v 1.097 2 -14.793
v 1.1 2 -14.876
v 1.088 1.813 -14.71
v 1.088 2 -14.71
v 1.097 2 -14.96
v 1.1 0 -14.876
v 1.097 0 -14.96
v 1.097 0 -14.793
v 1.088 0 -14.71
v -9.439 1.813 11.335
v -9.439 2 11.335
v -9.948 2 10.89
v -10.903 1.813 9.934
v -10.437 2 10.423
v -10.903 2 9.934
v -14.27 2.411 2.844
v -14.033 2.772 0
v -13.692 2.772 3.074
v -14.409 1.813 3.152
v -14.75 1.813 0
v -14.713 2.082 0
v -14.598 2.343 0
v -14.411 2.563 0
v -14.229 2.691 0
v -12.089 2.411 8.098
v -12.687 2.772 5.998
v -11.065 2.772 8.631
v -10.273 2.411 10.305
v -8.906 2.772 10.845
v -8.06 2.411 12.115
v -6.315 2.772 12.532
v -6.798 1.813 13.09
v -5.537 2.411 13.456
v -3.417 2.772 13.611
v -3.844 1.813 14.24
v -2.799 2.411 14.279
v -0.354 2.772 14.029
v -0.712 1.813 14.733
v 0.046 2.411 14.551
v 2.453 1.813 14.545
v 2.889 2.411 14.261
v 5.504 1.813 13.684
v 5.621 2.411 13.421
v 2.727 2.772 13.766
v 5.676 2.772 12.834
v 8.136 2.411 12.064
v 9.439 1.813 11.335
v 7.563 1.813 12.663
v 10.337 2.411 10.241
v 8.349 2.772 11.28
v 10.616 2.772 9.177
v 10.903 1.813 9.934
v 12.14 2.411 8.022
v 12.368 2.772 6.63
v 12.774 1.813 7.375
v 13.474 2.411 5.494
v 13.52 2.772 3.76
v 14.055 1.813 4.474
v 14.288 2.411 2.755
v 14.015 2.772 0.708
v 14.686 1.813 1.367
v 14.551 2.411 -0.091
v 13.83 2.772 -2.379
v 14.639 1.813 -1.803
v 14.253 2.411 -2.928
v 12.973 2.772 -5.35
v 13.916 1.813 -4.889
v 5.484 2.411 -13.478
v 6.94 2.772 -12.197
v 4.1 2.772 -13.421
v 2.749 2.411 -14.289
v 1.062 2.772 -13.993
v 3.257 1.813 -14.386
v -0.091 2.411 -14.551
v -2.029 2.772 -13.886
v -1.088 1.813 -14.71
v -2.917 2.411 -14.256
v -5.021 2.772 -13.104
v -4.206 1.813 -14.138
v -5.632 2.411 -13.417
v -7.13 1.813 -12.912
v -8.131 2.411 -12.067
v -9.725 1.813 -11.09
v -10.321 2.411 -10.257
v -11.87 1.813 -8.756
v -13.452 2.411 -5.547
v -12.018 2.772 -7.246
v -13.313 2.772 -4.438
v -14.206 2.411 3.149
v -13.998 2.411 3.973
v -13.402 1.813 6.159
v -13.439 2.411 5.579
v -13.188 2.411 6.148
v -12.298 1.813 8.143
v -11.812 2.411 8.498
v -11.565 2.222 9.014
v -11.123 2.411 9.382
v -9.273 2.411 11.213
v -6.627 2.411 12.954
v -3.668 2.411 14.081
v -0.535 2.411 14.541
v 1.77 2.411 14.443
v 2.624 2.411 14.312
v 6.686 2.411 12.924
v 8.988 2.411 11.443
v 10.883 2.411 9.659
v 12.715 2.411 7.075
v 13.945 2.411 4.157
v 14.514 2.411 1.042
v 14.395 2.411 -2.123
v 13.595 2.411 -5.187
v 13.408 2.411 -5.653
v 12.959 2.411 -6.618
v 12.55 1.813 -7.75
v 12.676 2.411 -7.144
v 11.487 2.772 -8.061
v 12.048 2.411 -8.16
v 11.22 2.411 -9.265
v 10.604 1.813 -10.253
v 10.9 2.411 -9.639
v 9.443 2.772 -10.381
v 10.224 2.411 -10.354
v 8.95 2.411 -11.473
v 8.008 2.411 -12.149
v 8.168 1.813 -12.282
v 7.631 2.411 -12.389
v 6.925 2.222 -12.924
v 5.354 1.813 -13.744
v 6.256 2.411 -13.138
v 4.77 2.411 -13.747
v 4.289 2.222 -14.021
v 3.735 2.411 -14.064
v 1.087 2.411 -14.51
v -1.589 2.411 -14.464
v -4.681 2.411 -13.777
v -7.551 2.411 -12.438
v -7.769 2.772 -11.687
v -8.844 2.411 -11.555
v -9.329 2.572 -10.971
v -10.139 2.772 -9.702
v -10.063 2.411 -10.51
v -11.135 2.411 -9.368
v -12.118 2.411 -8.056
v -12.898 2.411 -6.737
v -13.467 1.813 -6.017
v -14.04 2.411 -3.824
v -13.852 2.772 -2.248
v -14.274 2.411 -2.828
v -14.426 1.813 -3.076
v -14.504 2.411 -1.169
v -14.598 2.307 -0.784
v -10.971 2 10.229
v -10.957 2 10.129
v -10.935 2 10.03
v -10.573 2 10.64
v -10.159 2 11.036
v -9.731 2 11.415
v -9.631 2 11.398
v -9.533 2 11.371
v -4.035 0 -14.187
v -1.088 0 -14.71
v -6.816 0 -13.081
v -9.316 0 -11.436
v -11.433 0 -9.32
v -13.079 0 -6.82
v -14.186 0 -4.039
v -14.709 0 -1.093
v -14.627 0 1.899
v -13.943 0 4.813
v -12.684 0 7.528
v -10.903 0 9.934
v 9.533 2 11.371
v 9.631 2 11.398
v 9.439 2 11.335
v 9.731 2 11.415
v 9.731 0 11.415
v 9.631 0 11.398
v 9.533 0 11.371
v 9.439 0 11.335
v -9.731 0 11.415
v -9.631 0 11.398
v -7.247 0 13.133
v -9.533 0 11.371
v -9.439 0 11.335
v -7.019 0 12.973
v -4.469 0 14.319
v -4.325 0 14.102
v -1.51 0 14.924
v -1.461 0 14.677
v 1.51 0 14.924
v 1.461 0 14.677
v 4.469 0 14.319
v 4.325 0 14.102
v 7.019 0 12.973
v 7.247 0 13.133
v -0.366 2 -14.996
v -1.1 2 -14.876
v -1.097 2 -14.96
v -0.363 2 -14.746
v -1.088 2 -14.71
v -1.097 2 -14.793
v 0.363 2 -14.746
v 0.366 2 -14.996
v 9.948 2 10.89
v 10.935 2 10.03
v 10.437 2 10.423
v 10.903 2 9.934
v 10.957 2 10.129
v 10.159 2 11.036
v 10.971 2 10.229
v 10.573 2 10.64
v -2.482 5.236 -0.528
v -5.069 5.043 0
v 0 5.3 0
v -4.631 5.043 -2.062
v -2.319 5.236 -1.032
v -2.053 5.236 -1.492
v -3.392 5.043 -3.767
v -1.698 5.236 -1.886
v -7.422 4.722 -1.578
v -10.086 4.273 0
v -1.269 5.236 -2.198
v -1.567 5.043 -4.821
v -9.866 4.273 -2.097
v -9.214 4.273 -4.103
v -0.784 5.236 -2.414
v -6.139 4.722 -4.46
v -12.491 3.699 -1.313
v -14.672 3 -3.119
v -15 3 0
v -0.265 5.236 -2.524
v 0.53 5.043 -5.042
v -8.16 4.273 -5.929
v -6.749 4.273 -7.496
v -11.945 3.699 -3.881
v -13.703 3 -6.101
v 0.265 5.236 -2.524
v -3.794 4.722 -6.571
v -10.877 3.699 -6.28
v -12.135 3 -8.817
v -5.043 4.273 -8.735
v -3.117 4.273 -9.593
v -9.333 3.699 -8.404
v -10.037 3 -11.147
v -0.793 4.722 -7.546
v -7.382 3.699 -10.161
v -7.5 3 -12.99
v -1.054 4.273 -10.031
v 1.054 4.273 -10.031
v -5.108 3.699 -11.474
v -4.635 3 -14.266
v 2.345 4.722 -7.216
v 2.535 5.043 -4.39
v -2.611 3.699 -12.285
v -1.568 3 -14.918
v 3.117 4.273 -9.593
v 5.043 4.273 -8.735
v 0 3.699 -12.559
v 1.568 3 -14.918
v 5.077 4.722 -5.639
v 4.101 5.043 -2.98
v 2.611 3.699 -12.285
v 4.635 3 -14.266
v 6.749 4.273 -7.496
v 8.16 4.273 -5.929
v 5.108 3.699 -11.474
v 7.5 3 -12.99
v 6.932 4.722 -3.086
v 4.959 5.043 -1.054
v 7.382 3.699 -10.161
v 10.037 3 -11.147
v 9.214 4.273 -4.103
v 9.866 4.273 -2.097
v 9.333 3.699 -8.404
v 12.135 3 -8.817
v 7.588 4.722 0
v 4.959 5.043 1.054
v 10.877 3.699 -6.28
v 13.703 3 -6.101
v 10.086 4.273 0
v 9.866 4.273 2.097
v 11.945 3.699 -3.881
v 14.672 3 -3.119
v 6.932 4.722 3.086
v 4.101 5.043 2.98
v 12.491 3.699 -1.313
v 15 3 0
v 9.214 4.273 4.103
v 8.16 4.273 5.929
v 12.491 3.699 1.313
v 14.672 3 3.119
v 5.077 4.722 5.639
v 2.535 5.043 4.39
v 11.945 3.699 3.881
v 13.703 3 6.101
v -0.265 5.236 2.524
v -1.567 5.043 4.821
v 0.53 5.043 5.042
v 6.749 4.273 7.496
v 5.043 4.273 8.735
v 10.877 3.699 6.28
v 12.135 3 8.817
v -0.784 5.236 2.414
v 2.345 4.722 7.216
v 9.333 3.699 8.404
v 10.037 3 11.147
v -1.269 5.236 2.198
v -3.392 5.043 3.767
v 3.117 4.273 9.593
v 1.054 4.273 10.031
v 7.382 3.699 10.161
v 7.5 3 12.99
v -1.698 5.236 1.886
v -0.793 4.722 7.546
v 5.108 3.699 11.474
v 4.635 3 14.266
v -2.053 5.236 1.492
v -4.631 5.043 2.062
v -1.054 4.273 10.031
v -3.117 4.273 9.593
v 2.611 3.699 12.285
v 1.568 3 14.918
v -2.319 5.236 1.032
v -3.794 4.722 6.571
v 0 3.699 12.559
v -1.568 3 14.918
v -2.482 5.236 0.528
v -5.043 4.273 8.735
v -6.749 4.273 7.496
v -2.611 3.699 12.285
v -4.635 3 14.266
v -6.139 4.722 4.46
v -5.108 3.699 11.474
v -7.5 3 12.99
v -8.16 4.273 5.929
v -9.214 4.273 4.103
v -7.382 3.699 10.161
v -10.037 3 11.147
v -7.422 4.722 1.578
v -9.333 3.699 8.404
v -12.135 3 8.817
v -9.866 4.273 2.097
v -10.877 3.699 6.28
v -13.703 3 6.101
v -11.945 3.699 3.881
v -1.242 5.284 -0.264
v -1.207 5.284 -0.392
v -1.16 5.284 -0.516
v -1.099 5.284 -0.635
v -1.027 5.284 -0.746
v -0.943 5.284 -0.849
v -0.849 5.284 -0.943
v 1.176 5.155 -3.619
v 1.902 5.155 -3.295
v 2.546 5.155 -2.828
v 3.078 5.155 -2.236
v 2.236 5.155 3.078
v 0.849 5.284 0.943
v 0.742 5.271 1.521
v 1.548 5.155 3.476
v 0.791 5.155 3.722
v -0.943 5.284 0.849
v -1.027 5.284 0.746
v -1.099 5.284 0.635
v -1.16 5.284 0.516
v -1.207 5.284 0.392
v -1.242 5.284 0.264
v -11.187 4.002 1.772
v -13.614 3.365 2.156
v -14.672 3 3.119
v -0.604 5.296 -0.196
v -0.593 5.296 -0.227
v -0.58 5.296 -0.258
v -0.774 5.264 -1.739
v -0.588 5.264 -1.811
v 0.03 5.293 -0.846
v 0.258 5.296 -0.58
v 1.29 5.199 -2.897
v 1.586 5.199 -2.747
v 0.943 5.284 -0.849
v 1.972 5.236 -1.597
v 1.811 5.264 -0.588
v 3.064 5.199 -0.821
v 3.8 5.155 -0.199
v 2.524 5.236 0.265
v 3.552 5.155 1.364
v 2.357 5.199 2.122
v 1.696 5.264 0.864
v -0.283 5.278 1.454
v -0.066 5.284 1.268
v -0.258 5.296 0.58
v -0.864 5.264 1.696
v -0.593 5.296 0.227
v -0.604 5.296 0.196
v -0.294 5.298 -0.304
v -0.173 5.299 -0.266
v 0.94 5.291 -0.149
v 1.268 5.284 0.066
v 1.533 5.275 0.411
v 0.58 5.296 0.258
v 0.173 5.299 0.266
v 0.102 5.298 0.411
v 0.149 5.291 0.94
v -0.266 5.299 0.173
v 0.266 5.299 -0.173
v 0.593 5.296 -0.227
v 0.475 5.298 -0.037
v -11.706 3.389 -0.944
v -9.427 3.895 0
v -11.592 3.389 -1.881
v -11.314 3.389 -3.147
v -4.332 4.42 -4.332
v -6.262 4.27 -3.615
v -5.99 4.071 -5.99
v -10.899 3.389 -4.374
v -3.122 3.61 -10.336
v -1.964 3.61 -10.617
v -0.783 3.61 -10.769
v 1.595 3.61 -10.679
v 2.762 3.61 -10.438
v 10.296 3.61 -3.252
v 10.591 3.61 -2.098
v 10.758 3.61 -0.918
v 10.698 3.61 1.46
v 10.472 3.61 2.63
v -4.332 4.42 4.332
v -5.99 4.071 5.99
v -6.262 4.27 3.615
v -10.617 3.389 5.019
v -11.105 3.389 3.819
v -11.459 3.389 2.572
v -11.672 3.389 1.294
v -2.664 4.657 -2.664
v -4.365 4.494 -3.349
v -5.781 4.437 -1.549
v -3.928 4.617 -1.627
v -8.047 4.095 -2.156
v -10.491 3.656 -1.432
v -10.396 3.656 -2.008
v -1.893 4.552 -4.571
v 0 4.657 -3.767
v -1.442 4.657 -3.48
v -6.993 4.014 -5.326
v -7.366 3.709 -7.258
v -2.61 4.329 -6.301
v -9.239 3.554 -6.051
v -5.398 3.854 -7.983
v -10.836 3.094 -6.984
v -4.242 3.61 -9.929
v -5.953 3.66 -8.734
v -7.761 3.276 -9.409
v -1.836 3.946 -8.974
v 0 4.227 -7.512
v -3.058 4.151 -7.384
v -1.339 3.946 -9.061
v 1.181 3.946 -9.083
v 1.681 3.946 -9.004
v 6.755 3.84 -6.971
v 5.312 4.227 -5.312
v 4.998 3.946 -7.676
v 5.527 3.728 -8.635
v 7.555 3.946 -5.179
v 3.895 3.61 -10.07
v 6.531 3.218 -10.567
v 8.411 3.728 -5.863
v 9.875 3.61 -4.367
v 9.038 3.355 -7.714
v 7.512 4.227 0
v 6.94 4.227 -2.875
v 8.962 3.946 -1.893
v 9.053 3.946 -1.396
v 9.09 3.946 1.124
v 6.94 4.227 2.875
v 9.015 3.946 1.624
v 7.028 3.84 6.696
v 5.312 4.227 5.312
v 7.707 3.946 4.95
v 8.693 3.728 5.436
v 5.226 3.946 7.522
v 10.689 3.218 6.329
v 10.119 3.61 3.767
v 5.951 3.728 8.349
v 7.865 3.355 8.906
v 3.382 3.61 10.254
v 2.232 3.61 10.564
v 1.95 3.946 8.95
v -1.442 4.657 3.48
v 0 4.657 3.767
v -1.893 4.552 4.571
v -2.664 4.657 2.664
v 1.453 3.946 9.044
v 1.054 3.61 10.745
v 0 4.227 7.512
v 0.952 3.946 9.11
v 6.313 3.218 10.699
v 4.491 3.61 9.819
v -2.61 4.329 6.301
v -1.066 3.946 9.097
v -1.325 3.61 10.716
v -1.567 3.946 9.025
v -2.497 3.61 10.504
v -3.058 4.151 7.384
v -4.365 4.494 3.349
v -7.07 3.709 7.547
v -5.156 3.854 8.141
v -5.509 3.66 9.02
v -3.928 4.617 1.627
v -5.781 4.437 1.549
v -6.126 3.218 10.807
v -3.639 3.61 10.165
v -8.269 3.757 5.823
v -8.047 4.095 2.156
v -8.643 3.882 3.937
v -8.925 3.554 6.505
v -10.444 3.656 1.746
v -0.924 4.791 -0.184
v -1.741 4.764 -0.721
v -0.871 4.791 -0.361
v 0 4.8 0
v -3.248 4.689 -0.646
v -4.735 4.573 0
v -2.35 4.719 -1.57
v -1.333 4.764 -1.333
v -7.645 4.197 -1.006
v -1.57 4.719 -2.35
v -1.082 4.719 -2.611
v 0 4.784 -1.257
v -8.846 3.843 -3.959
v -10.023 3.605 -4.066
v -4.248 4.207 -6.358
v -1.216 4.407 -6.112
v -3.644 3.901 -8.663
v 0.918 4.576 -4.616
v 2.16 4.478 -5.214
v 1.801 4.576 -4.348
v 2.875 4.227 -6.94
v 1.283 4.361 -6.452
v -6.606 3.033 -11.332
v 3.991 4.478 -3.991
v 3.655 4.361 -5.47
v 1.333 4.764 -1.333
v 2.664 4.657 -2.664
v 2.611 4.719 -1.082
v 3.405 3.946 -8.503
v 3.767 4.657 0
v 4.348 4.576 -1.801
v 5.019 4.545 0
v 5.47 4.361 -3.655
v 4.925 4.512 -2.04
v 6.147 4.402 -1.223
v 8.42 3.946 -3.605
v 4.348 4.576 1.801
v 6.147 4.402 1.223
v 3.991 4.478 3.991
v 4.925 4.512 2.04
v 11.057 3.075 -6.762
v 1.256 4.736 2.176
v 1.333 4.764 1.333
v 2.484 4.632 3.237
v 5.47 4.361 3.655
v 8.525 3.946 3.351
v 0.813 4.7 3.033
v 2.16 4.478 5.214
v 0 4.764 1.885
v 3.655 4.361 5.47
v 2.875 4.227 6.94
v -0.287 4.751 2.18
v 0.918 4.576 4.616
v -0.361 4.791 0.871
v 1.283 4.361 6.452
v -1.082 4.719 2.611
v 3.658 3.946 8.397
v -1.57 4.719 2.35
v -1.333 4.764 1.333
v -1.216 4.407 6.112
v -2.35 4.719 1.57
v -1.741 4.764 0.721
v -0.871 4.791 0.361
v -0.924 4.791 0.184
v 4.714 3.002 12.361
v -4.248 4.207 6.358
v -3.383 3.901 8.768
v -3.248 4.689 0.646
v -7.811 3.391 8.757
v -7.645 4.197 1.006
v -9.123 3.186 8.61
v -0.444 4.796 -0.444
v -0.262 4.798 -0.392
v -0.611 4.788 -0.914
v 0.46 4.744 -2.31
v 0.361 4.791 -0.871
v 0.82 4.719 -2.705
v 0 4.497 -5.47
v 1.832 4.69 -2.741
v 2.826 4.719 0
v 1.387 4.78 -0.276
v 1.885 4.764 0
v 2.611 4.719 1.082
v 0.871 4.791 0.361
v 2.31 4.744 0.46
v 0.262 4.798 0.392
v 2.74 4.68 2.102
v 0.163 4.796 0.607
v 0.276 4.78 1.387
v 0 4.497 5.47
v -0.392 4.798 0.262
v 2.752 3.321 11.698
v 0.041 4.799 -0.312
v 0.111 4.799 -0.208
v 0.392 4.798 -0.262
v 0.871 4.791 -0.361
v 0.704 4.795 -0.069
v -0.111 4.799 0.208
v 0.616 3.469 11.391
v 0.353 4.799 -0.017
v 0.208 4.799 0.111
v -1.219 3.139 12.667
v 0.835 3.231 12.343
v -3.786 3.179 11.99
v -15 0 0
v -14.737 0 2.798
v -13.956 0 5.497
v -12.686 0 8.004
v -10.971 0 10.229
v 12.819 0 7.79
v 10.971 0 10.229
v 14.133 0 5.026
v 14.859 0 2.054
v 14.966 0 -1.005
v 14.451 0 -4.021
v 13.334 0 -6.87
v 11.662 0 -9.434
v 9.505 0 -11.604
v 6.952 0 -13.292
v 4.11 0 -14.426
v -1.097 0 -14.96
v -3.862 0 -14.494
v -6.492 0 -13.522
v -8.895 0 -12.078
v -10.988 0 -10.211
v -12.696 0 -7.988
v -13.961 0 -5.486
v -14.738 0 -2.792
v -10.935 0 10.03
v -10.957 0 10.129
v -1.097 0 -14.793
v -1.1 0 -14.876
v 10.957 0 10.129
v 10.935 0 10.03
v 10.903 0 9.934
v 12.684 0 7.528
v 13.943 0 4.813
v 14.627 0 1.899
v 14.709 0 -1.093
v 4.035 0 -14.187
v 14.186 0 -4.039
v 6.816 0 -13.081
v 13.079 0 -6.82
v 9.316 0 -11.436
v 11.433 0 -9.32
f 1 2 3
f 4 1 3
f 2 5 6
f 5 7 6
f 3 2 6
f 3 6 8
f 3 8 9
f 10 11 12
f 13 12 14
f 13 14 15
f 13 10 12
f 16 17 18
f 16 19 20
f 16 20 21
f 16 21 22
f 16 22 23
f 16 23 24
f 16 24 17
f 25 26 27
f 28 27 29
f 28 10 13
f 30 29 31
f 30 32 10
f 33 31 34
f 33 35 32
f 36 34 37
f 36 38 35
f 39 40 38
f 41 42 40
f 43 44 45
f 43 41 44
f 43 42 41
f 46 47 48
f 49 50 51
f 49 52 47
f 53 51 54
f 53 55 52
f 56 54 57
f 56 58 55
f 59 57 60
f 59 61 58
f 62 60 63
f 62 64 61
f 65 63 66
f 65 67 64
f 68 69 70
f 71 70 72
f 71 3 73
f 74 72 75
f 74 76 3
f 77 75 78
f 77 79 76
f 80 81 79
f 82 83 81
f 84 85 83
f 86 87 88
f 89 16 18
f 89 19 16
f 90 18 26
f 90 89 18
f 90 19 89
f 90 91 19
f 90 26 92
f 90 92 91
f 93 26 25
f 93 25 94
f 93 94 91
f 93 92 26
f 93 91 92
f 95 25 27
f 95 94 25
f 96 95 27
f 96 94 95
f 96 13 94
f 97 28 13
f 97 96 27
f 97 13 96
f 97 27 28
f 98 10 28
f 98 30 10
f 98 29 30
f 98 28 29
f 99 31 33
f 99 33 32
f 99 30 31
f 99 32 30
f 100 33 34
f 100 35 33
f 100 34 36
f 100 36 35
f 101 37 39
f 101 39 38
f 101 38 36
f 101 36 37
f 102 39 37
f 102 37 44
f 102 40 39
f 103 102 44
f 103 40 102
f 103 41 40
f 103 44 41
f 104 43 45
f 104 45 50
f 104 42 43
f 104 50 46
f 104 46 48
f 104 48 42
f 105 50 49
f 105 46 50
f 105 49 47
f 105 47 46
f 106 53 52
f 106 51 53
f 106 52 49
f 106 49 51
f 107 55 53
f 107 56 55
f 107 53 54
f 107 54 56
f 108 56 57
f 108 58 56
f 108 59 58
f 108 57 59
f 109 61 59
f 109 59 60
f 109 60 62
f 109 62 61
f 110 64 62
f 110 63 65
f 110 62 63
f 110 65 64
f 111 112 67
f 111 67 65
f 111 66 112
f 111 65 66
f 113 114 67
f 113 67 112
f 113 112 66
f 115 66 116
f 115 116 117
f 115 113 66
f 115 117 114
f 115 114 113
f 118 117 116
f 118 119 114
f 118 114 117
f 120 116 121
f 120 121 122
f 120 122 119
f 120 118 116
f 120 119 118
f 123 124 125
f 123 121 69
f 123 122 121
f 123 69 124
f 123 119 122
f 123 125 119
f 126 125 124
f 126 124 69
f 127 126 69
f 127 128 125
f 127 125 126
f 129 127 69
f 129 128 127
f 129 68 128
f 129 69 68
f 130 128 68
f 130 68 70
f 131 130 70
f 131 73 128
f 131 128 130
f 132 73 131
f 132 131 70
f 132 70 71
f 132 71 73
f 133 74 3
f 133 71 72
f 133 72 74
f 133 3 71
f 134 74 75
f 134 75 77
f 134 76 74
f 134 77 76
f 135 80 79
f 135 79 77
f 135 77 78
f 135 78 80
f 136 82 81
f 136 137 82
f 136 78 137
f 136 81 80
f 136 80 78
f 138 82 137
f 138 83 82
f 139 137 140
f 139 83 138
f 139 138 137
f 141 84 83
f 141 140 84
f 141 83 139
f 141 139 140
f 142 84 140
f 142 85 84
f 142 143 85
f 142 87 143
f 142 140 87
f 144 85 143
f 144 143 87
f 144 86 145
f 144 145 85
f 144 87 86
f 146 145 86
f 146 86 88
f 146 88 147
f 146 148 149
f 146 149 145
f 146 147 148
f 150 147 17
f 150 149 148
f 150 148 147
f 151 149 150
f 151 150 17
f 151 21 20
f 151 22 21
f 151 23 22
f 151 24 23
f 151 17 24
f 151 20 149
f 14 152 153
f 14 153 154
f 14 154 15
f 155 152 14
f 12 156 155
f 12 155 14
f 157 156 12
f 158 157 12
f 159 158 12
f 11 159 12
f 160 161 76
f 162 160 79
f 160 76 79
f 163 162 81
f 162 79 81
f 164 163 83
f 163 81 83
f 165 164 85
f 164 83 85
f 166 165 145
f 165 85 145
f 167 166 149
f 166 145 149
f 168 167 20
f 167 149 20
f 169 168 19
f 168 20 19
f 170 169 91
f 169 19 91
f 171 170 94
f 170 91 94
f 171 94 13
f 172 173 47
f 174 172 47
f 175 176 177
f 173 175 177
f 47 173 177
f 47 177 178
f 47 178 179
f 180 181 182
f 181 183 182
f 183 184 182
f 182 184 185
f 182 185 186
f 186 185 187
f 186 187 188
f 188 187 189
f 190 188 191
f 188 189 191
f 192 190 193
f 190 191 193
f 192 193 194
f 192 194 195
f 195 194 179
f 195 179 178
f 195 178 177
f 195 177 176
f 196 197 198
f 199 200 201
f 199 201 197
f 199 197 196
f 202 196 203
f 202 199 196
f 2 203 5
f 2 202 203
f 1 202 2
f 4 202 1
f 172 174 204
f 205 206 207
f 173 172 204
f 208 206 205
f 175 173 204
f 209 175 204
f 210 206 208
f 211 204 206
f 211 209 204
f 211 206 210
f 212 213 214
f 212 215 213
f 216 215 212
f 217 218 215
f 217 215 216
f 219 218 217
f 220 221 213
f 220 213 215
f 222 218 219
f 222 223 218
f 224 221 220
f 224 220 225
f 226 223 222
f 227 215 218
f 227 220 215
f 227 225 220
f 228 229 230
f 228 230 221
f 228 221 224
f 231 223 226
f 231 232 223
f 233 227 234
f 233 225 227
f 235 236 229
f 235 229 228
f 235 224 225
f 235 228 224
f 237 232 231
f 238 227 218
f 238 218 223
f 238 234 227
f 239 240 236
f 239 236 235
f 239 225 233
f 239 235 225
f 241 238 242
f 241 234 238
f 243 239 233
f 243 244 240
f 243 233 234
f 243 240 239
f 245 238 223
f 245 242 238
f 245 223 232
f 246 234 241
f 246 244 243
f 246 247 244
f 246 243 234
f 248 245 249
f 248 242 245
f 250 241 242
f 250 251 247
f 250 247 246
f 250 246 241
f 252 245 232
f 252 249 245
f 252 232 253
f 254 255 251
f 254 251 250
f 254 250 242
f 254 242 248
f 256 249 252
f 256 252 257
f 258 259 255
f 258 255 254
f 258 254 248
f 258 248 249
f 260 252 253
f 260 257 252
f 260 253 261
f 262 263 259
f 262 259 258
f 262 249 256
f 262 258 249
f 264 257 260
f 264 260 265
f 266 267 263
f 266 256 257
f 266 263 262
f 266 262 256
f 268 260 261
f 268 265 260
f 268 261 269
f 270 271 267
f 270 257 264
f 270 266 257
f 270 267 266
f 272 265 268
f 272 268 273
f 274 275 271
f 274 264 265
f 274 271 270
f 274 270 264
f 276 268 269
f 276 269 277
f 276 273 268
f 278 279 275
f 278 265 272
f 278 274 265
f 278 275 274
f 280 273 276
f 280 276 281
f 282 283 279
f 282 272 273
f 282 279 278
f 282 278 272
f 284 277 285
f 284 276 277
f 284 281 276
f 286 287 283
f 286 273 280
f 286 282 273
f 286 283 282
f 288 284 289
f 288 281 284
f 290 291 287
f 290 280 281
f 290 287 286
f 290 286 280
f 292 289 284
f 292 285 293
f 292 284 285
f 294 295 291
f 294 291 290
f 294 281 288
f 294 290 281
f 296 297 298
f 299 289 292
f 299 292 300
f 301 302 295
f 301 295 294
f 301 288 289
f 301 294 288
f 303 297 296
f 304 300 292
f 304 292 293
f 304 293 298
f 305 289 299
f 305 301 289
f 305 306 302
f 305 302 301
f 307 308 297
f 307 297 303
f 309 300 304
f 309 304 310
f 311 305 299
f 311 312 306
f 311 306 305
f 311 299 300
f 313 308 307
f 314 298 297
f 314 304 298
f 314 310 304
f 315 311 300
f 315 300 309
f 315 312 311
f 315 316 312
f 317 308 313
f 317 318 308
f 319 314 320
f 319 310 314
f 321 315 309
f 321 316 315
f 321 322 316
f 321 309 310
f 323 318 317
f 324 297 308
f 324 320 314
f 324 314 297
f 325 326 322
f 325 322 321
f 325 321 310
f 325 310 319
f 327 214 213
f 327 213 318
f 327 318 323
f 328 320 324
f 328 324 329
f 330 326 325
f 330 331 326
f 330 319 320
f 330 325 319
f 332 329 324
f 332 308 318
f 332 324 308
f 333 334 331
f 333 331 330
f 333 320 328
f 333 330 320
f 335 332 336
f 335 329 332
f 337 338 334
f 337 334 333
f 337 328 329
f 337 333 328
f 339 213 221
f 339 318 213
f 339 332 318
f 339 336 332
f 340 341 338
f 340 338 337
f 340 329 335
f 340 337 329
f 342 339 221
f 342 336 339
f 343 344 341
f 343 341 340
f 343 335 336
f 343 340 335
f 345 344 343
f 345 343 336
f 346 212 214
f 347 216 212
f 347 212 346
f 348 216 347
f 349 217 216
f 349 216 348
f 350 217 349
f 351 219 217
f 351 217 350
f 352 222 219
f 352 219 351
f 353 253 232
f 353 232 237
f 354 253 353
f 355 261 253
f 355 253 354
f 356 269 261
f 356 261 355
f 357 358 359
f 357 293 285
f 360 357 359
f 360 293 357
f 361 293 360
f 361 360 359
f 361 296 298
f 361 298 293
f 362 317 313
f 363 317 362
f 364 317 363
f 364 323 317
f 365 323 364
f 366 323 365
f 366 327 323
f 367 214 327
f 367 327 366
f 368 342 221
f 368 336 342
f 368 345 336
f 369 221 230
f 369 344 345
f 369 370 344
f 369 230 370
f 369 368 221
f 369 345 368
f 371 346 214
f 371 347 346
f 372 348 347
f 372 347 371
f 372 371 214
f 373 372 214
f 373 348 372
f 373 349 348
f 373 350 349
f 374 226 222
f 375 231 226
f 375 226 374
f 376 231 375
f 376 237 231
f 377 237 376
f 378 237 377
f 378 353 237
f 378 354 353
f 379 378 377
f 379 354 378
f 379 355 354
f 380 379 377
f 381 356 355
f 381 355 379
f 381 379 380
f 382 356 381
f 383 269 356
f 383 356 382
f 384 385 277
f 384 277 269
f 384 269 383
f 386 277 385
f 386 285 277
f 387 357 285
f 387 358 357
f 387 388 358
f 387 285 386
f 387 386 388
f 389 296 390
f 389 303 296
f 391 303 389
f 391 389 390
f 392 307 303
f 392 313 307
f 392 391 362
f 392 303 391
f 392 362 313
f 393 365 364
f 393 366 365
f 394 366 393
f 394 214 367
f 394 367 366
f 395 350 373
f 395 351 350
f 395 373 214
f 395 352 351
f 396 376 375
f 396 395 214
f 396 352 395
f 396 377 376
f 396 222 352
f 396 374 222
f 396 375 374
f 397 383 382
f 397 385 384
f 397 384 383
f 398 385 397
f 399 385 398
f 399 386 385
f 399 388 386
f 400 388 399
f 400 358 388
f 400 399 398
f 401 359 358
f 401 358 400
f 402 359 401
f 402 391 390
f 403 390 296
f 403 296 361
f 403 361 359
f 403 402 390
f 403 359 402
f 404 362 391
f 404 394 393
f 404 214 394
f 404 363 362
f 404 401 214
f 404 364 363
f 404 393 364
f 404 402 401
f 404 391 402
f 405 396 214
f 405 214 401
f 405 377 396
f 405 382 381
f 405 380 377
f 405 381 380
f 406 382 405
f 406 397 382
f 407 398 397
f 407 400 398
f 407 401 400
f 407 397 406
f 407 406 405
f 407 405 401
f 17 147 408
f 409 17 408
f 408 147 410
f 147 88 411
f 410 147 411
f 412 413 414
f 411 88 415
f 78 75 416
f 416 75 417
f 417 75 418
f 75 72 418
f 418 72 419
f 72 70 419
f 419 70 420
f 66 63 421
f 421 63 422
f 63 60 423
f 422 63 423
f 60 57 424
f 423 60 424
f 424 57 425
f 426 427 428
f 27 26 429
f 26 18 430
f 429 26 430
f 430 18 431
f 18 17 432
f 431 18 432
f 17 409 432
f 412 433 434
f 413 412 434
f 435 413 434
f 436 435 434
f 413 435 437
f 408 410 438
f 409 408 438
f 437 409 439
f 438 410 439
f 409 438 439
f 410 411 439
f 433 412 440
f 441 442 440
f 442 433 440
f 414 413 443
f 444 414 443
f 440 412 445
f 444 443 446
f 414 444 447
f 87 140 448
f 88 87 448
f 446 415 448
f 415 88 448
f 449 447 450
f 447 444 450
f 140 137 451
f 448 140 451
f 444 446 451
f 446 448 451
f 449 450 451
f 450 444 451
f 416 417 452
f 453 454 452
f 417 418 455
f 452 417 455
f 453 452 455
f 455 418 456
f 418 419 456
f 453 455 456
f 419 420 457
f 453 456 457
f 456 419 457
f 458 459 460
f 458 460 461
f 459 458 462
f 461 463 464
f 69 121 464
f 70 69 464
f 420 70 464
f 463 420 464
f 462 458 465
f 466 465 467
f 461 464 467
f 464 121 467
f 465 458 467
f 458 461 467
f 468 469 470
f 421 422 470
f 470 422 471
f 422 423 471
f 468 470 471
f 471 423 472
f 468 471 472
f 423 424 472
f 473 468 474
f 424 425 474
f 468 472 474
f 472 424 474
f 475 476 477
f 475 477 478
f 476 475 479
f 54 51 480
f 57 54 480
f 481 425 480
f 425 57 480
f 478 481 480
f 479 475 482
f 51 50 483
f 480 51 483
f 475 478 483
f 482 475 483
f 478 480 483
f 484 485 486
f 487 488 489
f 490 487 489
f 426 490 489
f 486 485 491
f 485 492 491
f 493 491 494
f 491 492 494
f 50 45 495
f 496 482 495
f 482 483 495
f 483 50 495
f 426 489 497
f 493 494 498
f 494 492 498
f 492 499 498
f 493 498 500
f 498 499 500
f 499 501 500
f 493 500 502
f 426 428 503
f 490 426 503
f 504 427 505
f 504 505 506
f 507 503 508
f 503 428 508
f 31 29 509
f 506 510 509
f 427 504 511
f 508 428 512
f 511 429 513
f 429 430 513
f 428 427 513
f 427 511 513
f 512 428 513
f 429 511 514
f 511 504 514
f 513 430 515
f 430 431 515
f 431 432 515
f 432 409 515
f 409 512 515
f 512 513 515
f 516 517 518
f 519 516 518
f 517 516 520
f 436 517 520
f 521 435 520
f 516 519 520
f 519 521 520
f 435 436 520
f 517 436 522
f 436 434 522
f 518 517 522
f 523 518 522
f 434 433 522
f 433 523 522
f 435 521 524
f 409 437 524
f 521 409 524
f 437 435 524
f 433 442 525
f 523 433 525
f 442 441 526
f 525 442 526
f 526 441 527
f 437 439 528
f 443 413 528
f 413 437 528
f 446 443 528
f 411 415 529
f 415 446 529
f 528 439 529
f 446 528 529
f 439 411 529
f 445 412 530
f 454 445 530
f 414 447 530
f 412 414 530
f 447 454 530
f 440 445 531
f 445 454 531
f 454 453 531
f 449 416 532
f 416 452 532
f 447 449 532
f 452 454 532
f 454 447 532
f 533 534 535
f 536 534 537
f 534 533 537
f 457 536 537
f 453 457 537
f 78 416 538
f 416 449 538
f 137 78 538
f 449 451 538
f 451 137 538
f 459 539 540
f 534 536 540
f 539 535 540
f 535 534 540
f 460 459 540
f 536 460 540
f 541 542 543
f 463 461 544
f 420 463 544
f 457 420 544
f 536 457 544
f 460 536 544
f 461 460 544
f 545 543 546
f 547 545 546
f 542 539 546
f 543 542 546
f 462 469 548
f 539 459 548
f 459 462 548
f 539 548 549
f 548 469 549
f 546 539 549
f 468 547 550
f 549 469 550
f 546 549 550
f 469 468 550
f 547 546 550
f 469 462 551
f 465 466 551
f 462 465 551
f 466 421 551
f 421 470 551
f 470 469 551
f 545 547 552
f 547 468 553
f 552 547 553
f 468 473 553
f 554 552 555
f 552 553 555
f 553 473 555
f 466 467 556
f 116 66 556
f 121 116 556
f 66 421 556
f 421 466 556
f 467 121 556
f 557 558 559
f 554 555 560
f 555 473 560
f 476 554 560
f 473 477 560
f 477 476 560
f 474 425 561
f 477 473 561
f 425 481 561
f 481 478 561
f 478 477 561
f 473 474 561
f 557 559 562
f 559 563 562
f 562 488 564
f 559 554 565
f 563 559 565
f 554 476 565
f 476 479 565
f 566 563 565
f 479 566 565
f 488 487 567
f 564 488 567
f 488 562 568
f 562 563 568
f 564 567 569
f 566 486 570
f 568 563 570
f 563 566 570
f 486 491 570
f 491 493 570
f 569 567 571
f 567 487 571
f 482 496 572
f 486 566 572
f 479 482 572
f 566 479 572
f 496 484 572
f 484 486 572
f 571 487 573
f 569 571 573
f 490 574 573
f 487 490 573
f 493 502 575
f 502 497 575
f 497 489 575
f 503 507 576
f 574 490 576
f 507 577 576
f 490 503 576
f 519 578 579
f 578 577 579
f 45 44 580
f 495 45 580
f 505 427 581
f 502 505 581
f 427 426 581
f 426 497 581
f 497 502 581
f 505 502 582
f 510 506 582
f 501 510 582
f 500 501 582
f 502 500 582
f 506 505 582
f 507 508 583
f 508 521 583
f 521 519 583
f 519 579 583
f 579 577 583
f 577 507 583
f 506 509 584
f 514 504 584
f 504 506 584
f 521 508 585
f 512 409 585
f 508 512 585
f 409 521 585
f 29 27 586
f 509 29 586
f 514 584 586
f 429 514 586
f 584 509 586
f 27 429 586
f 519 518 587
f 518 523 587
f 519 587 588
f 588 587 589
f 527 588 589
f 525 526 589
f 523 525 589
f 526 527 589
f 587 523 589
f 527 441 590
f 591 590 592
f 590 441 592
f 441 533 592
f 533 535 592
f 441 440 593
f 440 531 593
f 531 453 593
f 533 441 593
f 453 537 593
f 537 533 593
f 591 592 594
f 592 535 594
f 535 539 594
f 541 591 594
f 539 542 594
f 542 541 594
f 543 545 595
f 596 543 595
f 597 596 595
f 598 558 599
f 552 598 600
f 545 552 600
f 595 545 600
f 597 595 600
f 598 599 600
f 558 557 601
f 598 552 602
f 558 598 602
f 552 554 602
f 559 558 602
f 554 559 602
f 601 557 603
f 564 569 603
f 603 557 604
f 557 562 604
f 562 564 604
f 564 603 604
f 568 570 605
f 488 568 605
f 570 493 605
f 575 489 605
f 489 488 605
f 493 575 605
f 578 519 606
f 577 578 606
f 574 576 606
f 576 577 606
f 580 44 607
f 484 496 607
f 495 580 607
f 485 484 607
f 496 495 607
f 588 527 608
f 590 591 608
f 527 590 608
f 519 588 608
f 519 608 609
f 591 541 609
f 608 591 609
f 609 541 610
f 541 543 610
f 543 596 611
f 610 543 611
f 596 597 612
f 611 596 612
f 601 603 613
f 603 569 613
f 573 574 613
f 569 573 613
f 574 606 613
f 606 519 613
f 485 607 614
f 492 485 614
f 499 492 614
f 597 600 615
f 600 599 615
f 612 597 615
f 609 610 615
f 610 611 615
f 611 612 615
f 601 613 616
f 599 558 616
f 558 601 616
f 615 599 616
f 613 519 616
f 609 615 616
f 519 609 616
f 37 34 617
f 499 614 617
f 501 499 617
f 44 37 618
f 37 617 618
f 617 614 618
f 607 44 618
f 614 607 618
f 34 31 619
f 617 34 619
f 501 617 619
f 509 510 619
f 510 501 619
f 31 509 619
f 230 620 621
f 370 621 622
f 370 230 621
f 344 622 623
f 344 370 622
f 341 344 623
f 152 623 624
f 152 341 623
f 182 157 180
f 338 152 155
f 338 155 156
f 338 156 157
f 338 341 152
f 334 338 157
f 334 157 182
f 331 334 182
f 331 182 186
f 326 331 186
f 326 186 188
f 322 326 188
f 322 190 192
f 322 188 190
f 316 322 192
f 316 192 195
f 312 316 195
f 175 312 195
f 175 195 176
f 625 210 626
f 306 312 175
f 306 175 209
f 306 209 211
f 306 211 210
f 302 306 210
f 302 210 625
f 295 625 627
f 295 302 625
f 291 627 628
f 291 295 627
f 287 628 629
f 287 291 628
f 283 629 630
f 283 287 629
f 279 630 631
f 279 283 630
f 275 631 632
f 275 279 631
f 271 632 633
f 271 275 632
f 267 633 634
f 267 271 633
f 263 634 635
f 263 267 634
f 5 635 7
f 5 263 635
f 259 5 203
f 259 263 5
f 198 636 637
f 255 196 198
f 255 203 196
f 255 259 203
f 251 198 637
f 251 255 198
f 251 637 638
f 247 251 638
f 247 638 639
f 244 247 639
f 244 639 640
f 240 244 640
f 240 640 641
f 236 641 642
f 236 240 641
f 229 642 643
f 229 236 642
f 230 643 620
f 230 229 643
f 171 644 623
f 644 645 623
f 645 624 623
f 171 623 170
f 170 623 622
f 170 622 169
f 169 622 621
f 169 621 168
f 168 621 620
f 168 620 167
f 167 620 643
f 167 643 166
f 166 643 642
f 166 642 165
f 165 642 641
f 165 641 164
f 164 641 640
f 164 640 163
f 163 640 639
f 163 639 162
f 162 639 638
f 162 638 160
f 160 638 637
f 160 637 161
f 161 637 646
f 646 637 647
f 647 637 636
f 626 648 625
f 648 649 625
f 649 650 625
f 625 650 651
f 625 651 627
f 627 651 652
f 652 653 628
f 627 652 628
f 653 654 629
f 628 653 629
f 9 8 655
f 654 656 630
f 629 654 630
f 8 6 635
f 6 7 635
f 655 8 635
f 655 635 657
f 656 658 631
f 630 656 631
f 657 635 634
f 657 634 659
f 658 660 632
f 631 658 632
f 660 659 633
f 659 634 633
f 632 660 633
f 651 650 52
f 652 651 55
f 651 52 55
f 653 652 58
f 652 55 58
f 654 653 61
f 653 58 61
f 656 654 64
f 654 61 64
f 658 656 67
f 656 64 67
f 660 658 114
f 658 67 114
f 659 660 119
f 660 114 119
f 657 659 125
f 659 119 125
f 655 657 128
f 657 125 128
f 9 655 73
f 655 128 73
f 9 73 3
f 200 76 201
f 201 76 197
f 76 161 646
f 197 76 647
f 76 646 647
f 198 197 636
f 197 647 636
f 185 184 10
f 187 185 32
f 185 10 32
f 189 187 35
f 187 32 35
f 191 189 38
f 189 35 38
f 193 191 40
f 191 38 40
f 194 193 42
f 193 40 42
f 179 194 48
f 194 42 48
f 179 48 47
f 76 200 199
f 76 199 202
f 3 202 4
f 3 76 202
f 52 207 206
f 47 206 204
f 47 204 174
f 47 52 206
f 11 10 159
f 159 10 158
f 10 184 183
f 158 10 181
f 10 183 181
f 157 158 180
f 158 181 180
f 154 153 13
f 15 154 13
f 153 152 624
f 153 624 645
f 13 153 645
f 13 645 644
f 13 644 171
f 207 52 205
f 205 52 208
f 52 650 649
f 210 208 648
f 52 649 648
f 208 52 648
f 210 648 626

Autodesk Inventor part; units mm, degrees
ref_plane "YZ Plane" through (0, 0, 0) normal (1, 0, 0) x (0, 1, 0)
ref_plane "XZ Plane" through (0, 0, 0) normal (0, 1, 0) x (-1, 0, 0)
ref_plane "XY Plane" through (0, 0, 0) normal (0, 0, 1) x (1, 0, 0)
sketch "Эскиз1" plane through (0, 0, 0) normal (0, 0, 1) x (1, 0, 0)
  line L0 (-15, 0) -> (-15, 3)
  line L1 (-15, 0) -> (0, 0)
  line L2 (0, 2.3791) -> (0, 0.5542) construction
  arc A0 (0, 5.3) -> (-15, 3) centre (0, -44.763) ccw
  line L3 (0, 0) -> (0, 5.3) construction
  line L4 (0, 5.3) -> (0, 0)
  dimension "d0" = 3
  dimension "d1" = 15
  dimension "d6" = 5.3
revolve "Вращение1" add sketch "Эскиз1" angle 360 about axis through (0, 5.3, 0) along (0, -1, 0)
shell "Оболочка1" thickness 0.5 removed faces 1 at (-4.7094, 0, 0) ; own thickness 0.25 on faces at (-14.9514, 2, 1.207)
fillet "Сопряжение1" radius 1 1 edges at (14.75, 2.5543, 0.0003)
sketch "Эскиз2" plane through (0, 0, 0) normal (0, -1, 0) x (1, 0, 0)
  circle A0 centre (9.875, 10.325) radius 1.1
  circle A1 centre (-9.875, 10.325) radius 1.1
  line L0 (9.875, 10.325) -> (-9.875, 10.325) construction
  line L1 (0, 10.325) -> (0, -14.875) construction
  line L2 (0, -14.875) -> (-9.875, 10.325) construction
  line L3 (0, -14.875) -> (9.875, 10.325) construction
  circle A2 centre (0, -14.875) radius 1.1
  circle A3 centre (0, 0) radius 15 projected
  line L4 (0, -15) -> (0, -14.75)
  circle A4 centre (0, 0) radius 14.75 projected
  point P0 (0, -2.275)
  point P1 (0, -2.275)
  point P2 (-9.4386, 11.3347)
  point P3 (-10.9032, 9.934)
  point P4 (10.9032, 9.934)
  point P5 (9.4386, 11.3347)
  point P6 (-10.9708, 10.2294)
  point P7 (-9.7307, 11.4155)
  point P8 (9.7307, 11.4155)
  point P9 (10.9708, 10.2294)
  point P10 (1.0875, -14.7099)
  point P11 (-1.0875, -14.7099)
  point P12 (-1.0967, -14.9599)
  point P13 (1.0967, -14.9599)
  dimension "d11" = 2.2
  dimension "d12" = 19.75
  dimension "d15" = 25.2
extrude "Выдавливание1" cut sketch "Эскиз2" against normal blind 2 contours A0 A3 | A3 A0 A4 | A3 A1 | A1 A4 A3 | A3 L4 A4 A2 | A2 A4 L4 A3
properties part number "зрачок"
